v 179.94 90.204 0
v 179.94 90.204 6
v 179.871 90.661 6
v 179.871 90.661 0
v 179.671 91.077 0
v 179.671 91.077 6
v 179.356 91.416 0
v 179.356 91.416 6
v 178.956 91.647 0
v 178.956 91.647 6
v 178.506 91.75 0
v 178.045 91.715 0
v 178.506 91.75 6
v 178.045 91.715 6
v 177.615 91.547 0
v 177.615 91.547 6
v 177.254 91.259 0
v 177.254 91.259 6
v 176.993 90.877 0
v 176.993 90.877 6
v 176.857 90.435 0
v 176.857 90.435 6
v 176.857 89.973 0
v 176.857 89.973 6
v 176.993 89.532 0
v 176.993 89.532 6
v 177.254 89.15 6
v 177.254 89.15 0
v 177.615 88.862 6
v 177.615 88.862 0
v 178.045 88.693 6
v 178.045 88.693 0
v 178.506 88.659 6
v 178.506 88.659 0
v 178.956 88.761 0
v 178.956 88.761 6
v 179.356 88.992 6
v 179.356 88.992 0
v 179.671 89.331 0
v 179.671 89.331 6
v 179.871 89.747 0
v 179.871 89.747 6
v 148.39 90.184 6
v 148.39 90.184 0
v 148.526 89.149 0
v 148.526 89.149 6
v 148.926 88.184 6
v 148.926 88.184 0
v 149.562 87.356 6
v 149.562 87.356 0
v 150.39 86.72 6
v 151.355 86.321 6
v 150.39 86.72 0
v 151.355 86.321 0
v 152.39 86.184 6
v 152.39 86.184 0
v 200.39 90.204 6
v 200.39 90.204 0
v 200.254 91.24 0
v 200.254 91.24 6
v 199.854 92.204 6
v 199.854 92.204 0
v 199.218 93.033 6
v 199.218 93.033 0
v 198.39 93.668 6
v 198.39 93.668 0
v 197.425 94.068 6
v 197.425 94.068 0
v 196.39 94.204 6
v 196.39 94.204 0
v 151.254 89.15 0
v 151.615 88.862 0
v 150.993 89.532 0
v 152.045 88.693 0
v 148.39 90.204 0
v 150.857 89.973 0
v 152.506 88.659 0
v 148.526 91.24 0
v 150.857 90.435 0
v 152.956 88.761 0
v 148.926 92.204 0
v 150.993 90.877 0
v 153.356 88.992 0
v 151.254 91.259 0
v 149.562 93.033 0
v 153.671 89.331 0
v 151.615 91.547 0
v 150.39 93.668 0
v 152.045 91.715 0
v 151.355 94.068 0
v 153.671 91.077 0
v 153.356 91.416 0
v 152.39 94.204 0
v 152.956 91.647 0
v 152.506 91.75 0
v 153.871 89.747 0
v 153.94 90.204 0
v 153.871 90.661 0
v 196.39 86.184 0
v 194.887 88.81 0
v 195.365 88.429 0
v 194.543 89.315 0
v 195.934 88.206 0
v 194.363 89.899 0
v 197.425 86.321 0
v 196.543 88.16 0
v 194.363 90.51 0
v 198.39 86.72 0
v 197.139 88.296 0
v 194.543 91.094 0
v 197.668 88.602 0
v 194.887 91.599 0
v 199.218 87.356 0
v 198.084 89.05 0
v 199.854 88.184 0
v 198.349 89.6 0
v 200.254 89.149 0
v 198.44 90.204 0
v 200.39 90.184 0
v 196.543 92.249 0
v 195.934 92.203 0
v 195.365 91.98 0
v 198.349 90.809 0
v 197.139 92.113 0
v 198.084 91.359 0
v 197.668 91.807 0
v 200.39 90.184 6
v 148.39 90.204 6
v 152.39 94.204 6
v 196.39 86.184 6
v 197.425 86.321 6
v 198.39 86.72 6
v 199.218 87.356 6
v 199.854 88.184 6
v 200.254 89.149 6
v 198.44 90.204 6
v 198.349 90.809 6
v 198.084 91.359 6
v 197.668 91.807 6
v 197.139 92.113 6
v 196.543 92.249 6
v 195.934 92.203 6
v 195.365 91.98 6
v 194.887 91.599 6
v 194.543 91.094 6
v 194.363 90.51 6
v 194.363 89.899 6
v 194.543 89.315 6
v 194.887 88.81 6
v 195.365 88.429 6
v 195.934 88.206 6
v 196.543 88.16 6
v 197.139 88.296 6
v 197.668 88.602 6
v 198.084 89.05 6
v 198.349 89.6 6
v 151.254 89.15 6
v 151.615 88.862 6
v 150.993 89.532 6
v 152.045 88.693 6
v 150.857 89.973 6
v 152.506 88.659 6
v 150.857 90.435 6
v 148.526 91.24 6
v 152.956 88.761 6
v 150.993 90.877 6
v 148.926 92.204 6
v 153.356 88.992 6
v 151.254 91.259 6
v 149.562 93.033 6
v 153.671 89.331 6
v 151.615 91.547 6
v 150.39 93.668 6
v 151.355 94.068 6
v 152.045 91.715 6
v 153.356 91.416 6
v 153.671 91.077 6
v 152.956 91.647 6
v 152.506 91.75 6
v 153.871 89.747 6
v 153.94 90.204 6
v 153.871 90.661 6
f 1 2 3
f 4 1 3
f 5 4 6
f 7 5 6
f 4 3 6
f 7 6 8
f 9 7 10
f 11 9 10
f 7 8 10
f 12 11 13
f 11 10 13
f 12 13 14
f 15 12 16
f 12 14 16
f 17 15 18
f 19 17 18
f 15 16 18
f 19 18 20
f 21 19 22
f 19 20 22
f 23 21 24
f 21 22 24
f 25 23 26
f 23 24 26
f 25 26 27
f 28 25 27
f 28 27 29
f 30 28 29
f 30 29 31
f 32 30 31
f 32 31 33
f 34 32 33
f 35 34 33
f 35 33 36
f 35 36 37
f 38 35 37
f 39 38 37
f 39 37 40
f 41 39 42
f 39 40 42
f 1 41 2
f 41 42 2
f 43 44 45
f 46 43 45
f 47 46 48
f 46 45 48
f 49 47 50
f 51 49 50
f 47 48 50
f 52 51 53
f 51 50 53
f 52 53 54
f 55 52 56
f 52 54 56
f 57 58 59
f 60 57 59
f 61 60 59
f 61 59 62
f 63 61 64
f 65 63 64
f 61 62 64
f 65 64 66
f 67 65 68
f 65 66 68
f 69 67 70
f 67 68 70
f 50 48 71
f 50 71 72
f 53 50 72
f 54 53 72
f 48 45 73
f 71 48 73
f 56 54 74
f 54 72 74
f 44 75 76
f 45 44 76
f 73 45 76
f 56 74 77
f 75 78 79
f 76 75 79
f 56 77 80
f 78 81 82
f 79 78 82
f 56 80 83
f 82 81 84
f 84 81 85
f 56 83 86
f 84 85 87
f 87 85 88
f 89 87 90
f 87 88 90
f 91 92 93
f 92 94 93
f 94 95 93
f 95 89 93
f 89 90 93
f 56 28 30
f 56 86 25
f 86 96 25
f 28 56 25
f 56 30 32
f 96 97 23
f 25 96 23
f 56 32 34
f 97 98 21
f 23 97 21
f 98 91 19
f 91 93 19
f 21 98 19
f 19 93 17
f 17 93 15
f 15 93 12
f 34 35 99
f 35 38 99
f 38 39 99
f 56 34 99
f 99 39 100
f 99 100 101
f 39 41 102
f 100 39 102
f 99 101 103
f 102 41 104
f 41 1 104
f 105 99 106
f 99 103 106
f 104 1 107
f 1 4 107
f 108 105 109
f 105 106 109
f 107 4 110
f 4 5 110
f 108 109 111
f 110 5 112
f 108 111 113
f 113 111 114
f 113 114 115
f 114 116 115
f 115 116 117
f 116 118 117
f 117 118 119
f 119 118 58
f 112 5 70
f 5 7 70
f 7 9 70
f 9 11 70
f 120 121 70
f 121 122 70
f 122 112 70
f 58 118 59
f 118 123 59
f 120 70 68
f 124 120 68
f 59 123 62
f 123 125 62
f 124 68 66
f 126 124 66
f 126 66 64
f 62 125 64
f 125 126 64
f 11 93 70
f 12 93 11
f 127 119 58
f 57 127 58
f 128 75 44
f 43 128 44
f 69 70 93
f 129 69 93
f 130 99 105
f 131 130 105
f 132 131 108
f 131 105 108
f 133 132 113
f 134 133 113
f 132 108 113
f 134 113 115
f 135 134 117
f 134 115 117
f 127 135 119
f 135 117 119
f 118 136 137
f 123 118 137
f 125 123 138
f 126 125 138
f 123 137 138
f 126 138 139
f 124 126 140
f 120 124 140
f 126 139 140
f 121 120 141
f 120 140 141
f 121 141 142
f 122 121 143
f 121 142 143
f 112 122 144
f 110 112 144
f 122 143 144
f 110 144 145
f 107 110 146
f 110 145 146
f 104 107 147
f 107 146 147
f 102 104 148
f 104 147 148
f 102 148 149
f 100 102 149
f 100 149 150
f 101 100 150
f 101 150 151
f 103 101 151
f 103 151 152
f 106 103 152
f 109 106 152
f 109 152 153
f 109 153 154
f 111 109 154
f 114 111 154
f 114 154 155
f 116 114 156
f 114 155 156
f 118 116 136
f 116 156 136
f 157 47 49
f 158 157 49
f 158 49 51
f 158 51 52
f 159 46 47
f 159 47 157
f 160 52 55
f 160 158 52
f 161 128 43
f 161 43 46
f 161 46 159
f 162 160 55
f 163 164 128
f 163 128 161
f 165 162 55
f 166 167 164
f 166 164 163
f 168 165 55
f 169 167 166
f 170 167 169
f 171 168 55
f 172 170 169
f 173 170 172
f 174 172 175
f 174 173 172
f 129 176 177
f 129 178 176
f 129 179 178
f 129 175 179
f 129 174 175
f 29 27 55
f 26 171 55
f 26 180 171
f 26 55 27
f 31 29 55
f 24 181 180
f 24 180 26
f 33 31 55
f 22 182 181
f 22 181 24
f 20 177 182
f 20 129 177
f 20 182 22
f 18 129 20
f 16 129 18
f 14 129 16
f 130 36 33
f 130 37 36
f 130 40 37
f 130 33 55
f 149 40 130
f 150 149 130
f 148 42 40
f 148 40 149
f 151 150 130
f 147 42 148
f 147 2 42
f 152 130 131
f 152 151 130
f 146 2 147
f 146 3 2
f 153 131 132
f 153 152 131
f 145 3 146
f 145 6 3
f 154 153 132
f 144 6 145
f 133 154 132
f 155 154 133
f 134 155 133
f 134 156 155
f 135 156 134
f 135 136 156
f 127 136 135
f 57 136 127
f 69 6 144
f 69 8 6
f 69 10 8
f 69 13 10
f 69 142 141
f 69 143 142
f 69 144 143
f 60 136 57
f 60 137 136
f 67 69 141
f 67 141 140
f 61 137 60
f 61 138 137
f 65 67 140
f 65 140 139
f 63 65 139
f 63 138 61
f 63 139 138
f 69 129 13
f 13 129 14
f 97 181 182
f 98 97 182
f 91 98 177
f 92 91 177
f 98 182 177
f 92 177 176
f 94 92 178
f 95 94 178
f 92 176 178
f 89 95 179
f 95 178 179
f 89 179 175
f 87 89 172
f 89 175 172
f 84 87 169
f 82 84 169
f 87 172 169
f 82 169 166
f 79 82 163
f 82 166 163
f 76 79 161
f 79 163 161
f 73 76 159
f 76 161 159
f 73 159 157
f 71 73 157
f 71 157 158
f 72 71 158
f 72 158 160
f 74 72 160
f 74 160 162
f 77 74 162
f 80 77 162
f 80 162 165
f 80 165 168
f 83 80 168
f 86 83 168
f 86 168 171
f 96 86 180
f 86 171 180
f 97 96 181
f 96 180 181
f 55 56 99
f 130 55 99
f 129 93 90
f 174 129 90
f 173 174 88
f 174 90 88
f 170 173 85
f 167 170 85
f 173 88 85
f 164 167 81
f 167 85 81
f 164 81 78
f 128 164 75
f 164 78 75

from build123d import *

# Parameters (mm, degrees)
DODANIE_WYCI_GNI_CIE1_DEPTH = 6
SZKIC2_R                    = 2.05
SZKIC2_R_2                  = 1.55
WYTNIJ_WYCI_GNI_CIE1_DEPTH  = 6


with BuildPart() as part:
    # Szkic1 → Dodanie-wyciągnięcie1 (new body)
    with BuildSketch(Plane.XY):
        with BuildLine():
            Line((148.389986738, 90.204311715), (148.389986738, 90.184311715))
            ThreePointArc((148.389986738, 90.184311715), (149.561559613, 87.35588459), (152.389986738, 86.184311715))
            Line((152.389986738, 86.184311715), (196.389986738, 86.184311715))
            ThreePointArc((196.389986738, 86.184311715), (199.218413863, 87.35588459), (200.389986738, 90.184311715))
            Line((200.389986738, 90.184311715), (200.389986738, 90.204311715))
            ThreePointArc((200.389986738, 90.204311715), (199.218413863, 93.032738839), (196.389986738, 94.204311715))
            Line((196.389986738, 94.204311715), (152.389986738, 94.204311715))
            ThreePointArc((152.389986738, 94.204311715), (149.561559613, 93.032738839), (148.389986738, 90.204311715))
        make_face()
    extrude(amount=DODANIE_WYCI_GNI_CIE1_DEPTH)

    # Szkic2 → Wytnij-wyciągnięcie1 (cut)
    with BuildSketch(Plane.XY.offset(6)):
        with Locations((196.389986738, 90.204311714)):
            Circle(SZKIC2_R)
        with Locations((178.389986738, 90.204311714)):
            Circle(SZKIC2_R_2)
        with Locations((152.389986738, 90.204311714)):
            Circle(SZKIC2_R_2)
    extrude(amount=-WYTNIJ_WYCI_GNI_CIE1_DEPTH, mode=Mode.SUBTRACT)


solid = part.part
